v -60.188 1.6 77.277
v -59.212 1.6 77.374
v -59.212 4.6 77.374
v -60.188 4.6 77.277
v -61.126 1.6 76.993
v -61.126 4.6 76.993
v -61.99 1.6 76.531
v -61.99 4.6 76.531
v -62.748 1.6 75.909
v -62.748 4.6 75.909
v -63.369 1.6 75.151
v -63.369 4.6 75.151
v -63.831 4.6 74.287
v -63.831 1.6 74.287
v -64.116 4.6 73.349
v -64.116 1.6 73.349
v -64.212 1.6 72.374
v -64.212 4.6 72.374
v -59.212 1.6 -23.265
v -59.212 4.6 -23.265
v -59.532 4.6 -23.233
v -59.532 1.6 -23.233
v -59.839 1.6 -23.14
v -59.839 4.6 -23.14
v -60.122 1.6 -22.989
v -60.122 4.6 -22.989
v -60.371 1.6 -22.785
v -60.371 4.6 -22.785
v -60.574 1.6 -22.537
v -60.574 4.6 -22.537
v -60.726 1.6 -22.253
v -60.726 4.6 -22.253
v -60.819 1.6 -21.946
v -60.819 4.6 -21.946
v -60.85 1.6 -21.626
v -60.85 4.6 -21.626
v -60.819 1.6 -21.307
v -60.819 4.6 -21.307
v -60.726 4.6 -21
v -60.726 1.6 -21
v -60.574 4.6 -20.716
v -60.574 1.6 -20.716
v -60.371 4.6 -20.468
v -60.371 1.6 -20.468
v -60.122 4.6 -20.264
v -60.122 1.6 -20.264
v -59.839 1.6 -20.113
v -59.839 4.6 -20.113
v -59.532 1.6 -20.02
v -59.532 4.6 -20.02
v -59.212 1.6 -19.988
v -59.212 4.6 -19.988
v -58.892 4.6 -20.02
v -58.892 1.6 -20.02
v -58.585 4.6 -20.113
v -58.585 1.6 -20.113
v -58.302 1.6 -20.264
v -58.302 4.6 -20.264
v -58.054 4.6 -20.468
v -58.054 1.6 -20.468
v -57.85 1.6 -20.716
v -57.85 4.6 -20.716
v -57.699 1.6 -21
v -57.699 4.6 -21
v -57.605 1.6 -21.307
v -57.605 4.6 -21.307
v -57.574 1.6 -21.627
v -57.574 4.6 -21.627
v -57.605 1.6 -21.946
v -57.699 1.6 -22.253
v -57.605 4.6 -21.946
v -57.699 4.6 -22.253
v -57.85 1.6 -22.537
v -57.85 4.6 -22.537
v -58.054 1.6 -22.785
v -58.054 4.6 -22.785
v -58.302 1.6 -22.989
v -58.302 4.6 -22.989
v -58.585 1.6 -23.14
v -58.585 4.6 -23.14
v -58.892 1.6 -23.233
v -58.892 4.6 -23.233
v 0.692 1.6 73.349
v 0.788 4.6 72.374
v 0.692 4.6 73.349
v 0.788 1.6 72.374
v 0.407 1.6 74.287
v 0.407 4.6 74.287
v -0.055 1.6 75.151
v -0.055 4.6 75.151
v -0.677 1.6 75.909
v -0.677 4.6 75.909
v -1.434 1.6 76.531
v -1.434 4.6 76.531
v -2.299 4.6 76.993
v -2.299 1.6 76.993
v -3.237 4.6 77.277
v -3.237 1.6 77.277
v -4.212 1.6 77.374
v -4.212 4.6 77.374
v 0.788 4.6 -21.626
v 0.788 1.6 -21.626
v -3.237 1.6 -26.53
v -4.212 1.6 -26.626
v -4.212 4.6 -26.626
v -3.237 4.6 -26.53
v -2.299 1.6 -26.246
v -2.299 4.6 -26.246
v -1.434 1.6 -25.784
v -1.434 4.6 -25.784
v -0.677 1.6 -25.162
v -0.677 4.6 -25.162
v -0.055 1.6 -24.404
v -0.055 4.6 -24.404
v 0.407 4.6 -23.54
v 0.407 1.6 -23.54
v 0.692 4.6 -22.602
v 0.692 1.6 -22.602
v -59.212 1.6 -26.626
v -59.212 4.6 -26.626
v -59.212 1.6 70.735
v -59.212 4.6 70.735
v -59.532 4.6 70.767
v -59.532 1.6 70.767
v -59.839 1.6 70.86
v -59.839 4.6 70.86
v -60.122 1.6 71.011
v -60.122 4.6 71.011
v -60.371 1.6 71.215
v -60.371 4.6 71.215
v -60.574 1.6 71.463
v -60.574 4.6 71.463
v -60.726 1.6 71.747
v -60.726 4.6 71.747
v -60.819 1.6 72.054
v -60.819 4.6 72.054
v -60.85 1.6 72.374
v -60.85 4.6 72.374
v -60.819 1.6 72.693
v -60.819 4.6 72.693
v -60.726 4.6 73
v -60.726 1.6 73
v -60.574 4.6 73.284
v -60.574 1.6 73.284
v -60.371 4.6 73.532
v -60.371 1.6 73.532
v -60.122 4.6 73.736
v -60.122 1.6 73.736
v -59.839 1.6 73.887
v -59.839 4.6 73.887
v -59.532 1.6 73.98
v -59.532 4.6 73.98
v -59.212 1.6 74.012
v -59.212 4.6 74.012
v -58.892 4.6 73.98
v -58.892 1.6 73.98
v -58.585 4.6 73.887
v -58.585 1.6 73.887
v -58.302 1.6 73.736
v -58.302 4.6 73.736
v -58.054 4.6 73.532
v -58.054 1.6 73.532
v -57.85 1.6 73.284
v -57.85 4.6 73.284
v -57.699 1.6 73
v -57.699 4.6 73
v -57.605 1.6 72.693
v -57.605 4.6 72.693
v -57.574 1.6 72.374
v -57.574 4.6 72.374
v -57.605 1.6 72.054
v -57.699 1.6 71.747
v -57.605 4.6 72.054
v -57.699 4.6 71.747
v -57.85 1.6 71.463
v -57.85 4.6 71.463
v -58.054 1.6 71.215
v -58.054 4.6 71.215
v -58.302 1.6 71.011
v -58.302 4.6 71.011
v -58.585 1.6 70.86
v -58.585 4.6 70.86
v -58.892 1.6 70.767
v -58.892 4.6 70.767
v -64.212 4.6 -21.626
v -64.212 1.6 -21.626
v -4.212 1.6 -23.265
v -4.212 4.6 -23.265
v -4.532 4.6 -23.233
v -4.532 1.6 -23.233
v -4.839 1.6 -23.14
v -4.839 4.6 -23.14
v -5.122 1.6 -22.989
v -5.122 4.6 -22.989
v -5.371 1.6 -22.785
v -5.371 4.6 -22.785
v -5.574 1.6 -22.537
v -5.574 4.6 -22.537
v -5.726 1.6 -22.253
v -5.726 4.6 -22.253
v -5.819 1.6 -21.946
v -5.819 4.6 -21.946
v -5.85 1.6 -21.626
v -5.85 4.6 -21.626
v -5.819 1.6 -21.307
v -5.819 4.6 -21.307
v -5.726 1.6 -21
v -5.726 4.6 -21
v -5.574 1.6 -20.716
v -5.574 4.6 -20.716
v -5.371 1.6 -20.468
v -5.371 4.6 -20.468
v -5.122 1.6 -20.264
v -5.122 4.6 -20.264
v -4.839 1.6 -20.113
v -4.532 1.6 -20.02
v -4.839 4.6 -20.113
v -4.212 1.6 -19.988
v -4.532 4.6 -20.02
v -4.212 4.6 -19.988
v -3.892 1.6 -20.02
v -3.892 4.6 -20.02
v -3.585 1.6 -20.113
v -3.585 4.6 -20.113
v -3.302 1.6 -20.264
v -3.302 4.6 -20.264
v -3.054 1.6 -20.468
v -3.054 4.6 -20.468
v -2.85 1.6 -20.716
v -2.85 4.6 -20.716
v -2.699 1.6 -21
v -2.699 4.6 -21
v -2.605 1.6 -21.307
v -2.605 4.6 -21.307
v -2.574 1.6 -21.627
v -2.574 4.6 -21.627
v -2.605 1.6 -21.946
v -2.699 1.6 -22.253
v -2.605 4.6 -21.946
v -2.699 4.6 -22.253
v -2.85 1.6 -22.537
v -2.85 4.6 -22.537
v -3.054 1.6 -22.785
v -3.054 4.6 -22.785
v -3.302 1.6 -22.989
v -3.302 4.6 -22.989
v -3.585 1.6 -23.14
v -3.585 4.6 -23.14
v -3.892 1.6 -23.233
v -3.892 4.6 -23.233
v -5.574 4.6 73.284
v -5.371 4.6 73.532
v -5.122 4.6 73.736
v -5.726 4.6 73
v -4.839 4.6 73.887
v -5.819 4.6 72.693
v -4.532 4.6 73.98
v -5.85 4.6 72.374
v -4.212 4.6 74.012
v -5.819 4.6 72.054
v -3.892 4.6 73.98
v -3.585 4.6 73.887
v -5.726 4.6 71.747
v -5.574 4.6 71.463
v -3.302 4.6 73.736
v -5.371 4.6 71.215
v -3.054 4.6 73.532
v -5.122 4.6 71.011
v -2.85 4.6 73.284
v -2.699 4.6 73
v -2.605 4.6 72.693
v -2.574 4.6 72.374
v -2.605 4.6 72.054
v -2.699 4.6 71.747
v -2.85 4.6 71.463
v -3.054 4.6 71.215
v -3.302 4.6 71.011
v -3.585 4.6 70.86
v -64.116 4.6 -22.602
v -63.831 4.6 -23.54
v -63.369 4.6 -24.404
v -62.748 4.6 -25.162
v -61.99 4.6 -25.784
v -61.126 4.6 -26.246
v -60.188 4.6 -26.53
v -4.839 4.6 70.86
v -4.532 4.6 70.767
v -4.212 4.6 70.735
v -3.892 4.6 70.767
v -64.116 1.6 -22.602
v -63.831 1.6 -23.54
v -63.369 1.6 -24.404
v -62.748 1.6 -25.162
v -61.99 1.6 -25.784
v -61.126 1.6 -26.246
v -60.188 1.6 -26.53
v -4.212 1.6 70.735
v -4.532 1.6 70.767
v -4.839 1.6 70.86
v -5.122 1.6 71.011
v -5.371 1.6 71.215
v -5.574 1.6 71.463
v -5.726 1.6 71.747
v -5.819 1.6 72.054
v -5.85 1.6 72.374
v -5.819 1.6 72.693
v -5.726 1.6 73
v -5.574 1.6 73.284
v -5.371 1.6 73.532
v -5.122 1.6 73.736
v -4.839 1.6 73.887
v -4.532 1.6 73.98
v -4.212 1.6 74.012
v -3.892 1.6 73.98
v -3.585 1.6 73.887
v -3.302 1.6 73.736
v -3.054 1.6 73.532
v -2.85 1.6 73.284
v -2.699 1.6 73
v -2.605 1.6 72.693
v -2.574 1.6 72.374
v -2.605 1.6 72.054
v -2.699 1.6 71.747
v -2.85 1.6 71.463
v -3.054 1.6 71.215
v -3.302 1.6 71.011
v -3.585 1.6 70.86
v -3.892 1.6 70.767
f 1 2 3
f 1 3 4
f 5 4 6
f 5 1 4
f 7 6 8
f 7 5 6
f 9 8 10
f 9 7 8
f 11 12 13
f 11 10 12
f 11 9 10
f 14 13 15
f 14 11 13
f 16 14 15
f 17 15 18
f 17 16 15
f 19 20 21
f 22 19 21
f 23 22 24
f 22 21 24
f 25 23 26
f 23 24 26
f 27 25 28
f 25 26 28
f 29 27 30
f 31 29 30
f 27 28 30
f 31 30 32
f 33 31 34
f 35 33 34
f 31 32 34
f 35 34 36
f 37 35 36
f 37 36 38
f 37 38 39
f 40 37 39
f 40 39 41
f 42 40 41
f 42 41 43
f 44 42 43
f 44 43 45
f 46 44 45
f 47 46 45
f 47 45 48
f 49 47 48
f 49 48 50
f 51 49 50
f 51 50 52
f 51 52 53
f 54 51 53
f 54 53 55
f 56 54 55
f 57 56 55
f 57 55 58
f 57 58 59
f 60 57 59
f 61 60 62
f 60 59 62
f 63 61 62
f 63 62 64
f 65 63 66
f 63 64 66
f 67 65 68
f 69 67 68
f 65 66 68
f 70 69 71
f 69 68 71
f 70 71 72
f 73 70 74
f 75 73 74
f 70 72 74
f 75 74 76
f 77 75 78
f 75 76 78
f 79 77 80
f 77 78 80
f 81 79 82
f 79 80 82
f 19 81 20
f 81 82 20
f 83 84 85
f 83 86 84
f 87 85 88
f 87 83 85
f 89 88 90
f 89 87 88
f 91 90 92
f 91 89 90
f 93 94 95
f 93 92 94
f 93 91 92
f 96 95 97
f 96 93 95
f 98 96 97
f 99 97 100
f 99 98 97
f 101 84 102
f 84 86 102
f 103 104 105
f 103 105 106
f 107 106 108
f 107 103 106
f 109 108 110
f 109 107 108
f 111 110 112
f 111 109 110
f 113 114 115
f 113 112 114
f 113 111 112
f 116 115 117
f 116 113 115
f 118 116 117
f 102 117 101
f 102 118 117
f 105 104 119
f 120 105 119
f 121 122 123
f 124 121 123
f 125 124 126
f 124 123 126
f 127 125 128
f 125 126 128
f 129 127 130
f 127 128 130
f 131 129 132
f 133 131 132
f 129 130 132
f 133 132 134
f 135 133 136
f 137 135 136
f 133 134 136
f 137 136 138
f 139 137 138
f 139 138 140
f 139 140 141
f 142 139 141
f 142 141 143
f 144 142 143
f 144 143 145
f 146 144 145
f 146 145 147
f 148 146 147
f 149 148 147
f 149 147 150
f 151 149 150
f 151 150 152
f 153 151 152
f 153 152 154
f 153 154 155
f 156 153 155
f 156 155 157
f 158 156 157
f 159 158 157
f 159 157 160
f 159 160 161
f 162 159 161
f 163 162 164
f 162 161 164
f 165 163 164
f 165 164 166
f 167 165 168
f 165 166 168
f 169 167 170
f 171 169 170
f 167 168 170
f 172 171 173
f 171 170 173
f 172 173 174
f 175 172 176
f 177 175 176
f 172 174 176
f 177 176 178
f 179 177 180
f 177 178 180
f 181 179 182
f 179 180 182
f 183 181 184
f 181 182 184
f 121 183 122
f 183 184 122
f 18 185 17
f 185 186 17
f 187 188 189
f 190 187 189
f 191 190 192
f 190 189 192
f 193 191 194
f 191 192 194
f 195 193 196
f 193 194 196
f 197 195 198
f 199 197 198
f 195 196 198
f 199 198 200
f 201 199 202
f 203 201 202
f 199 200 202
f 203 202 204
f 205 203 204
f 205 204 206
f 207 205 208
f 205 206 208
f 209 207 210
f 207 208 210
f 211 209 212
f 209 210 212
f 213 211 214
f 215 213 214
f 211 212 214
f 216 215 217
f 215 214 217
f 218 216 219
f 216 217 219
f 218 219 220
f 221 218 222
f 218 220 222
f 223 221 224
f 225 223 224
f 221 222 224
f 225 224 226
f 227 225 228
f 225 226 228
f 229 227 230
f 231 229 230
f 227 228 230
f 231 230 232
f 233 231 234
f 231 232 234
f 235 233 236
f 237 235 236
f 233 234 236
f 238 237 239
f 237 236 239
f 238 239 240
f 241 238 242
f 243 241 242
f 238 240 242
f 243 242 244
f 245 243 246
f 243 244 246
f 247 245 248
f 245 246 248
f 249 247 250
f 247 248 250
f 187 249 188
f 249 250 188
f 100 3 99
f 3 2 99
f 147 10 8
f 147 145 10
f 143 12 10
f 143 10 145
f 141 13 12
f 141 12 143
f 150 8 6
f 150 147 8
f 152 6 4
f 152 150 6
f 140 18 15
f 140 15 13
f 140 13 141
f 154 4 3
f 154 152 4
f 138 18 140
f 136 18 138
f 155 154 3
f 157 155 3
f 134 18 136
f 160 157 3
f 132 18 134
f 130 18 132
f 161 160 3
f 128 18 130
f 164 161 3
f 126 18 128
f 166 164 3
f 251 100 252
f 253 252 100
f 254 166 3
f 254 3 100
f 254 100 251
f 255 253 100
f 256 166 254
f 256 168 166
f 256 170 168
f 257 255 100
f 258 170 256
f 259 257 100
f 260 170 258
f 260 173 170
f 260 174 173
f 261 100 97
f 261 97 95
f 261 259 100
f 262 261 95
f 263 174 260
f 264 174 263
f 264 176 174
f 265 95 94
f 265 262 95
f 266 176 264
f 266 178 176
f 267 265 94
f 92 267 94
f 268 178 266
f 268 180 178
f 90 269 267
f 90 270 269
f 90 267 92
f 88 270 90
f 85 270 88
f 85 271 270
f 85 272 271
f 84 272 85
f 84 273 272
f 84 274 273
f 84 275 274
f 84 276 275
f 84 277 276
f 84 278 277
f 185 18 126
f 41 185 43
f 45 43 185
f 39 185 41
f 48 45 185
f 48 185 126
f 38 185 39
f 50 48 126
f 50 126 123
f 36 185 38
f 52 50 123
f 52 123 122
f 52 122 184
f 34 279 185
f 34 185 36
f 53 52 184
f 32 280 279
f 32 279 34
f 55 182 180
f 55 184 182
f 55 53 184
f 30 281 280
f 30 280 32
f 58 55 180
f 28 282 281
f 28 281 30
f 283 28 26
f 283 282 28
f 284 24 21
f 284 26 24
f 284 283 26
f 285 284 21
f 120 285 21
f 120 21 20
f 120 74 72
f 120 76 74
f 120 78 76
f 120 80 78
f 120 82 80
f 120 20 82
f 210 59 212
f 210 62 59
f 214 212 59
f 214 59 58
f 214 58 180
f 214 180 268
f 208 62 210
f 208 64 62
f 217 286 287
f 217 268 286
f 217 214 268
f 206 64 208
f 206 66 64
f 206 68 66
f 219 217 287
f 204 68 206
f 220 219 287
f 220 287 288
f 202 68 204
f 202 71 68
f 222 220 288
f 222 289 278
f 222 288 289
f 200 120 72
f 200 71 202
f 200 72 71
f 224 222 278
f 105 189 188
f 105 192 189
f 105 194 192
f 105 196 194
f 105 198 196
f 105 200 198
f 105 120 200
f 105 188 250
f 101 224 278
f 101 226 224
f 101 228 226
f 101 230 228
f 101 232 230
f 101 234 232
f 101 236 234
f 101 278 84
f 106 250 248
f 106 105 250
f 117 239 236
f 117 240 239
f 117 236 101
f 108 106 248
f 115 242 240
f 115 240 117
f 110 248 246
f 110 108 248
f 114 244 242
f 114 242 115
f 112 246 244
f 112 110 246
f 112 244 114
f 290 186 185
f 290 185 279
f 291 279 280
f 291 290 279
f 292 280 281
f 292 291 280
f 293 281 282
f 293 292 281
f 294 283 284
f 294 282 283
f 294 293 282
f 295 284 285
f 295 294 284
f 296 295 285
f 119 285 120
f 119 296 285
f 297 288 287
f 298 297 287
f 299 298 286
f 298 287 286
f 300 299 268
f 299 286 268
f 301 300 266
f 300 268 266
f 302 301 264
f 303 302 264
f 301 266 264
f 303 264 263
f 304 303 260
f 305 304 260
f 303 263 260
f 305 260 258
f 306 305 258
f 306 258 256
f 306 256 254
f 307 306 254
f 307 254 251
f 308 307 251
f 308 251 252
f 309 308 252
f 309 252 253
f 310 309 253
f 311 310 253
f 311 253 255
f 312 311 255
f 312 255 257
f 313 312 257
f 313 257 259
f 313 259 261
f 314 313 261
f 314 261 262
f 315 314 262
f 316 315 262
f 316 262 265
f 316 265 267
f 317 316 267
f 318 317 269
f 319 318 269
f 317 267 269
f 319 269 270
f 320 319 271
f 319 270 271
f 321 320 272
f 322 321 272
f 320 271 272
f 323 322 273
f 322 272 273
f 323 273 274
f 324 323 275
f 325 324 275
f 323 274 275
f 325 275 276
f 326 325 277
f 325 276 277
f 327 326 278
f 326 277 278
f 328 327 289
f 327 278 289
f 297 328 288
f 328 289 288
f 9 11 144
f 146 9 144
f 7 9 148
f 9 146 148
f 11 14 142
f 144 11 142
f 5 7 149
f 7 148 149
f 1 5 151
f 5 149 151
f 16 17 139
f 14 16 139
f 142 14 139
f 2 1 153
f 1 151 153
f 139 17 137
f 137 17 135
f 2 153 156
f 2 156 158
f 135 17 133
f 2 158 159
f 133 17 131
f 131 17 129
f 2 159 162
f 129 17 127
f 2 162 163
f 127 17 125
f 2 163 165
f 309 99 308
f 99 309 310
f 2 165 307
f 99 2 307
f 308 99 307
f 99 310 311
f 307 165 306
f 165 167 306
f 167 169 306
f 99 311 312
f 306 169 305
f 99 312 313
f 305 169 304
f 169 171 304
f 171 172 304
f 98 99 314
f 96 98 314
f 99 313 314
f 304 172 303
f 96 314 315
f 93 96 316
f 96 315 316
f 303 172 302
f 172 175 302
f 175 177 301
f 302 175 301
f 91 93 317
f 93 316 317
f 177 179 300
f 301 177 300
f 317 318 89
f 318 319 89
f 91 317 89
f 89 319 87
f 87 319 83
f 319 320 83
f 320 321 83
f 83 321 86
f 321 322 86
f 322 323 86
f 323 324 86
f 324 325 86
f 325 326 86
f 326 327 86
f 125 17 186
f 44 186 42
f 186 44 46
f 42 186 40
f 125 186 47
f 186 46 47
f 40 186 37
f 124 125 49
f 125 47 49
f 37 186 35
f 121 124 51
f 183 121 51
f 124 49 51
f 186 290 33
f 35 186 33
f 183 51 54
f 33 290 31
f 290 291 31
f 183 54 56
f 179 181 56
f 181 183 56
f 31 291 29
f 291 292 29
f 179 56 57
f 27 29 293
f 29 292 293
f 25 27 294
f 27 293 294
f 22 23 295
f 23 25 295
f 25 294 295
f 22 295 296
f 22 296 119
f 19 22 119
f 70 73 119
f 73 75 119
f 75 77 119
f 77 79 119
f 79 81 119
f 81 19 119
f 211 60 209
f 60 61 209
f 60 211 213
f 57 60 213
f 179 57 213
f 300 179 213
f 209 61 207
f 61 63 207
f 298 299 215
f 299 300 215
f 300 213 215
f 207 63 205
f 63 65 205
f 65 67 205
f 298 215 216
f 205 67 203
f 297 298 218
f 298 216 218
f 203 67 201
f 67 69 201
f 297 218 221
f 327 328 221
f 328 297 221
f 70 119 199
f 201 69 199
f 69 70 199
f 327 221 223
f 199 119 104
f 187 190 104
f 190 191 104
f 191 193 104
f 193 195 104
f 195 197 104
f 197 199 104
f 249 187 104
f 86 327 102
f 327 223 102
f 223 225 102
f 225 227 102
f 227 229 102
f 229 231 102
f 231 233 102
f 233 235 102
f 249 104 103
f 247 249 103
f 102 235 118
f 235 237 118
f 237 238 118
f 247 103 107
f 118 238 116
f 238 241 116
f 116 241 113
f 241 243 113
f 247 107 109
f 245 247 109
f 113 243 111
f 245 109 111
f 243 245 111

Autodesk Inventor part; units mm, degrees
ref_plane "YZ Plane" through (0, 0, 0) normal (1, 0, 0) x (0, 1, 0)
ref_plane "XZ Plane" through (0, 0, 0) normal (0, 1, 0) x (-1, 0, 0)
ref_plane "Work Plane2" through (-36.5132, 1.6, 47.4786) normal (0, 1, 0) x (1, 0, 0)
sketch "Sketch1" plane through (-36.5132, 1.6, 47.4786) normal (0, 1, 0) x (1, 0, 0)
  line L0 (-22.6989, -29.8949) -> (32.3011, -29.8949)
  line L1 (37.3011, -24.8949) -> (37.3011, 69.1051)
  line L2 (32.3011, 74.1051) -> (-22.6989, 74.1051)
  line L3 (-27.6989, 69.1051) -> (-27.6989, -24.8949)
  arc A0 (-27.6989, -24.8949) -> (-22.6989, -29.8949) centre (-22.6989, -24.8949) ccw
  arc A1 (-22.6989, 74.1051) -> (-27.6989, 69.1051) centre (-22.6989, 69.1051) ccw
  arc A2 (37.3011, 69.1051) -> (32.3011, 74.1051) centre (32.3011, 69.1051) ccw
  arc A3 (32.3011, -29.8949) -> (37.3011, -24.8949) centre (32.3011, -24.8949) ccw
  line L4 (-22.6989, -24.8949) -> (32.3011, -24.8949) construction
  line L5 (32.3011, -24.8949) -> (32.3011, 69.1051) construction
  line L6 (32.3011, 69.1051) -> (-22.6989, 69.1051) construction
  line L7 (-22.6989, 69.1051) -> (-22.6989, -24.8949) construction
  dimension "d2" = 5
  dimension "d5" = 94
  dimension "d6" = 55
extrude "Extrusion1" add sketch "Sketch1" along normal blind 3
sketch "Sketch2" plane through (-36.5132, 1.6, 47.4786) normal (0, -1, 0) x (1, 0, 0)
  arc A0 (-22.6989, 29.8949) -> (-27.6989, 24.8949) centre (-22.6989, 24.8949) ccw construction
  arc A1 (-27.6989, -69.1051) -> (-22.6989, -74.1051) centre (-22.6989, -69.1051) ccw construction
  arc A2 (32.3011, -74.1051) -> (37.3011, -69.1051) centre (32.3011, -69.1051) ccw construction
  arc A3 (37.3011, 24.8949) -> (32.3011, 29.8949) centre (32.3011, 24.8949) ccw construction
hole "Hole1" at (-59.2121, 1.6, -21.6265) at (-4.2121, 1.6, 72.3735) at (-59.2121, 1.6, 72.3735) at (-4.2121, 1.6, -21.6265) direction (0, 1, 0) diameter 3.2766 end through all clearance for "Socket Head Cap Screw" size "#4" standard "Ansi Unified Screw Threads"
equation "\"d5\" = LCD_PCB_Horizontal_Hole_Spacing"
equation "\"d6\" = LCD_PCB_Vertical_Hole_Spacing"
equation "\"LCD_PCB_Horizontal_Hole_Spacing\" = 94"
equation "\"LCD_PCB_Vertical_Hole_Spacing\" = 55"
properties part number "LCD_Cover" material "Polycarbonate, Clear"
